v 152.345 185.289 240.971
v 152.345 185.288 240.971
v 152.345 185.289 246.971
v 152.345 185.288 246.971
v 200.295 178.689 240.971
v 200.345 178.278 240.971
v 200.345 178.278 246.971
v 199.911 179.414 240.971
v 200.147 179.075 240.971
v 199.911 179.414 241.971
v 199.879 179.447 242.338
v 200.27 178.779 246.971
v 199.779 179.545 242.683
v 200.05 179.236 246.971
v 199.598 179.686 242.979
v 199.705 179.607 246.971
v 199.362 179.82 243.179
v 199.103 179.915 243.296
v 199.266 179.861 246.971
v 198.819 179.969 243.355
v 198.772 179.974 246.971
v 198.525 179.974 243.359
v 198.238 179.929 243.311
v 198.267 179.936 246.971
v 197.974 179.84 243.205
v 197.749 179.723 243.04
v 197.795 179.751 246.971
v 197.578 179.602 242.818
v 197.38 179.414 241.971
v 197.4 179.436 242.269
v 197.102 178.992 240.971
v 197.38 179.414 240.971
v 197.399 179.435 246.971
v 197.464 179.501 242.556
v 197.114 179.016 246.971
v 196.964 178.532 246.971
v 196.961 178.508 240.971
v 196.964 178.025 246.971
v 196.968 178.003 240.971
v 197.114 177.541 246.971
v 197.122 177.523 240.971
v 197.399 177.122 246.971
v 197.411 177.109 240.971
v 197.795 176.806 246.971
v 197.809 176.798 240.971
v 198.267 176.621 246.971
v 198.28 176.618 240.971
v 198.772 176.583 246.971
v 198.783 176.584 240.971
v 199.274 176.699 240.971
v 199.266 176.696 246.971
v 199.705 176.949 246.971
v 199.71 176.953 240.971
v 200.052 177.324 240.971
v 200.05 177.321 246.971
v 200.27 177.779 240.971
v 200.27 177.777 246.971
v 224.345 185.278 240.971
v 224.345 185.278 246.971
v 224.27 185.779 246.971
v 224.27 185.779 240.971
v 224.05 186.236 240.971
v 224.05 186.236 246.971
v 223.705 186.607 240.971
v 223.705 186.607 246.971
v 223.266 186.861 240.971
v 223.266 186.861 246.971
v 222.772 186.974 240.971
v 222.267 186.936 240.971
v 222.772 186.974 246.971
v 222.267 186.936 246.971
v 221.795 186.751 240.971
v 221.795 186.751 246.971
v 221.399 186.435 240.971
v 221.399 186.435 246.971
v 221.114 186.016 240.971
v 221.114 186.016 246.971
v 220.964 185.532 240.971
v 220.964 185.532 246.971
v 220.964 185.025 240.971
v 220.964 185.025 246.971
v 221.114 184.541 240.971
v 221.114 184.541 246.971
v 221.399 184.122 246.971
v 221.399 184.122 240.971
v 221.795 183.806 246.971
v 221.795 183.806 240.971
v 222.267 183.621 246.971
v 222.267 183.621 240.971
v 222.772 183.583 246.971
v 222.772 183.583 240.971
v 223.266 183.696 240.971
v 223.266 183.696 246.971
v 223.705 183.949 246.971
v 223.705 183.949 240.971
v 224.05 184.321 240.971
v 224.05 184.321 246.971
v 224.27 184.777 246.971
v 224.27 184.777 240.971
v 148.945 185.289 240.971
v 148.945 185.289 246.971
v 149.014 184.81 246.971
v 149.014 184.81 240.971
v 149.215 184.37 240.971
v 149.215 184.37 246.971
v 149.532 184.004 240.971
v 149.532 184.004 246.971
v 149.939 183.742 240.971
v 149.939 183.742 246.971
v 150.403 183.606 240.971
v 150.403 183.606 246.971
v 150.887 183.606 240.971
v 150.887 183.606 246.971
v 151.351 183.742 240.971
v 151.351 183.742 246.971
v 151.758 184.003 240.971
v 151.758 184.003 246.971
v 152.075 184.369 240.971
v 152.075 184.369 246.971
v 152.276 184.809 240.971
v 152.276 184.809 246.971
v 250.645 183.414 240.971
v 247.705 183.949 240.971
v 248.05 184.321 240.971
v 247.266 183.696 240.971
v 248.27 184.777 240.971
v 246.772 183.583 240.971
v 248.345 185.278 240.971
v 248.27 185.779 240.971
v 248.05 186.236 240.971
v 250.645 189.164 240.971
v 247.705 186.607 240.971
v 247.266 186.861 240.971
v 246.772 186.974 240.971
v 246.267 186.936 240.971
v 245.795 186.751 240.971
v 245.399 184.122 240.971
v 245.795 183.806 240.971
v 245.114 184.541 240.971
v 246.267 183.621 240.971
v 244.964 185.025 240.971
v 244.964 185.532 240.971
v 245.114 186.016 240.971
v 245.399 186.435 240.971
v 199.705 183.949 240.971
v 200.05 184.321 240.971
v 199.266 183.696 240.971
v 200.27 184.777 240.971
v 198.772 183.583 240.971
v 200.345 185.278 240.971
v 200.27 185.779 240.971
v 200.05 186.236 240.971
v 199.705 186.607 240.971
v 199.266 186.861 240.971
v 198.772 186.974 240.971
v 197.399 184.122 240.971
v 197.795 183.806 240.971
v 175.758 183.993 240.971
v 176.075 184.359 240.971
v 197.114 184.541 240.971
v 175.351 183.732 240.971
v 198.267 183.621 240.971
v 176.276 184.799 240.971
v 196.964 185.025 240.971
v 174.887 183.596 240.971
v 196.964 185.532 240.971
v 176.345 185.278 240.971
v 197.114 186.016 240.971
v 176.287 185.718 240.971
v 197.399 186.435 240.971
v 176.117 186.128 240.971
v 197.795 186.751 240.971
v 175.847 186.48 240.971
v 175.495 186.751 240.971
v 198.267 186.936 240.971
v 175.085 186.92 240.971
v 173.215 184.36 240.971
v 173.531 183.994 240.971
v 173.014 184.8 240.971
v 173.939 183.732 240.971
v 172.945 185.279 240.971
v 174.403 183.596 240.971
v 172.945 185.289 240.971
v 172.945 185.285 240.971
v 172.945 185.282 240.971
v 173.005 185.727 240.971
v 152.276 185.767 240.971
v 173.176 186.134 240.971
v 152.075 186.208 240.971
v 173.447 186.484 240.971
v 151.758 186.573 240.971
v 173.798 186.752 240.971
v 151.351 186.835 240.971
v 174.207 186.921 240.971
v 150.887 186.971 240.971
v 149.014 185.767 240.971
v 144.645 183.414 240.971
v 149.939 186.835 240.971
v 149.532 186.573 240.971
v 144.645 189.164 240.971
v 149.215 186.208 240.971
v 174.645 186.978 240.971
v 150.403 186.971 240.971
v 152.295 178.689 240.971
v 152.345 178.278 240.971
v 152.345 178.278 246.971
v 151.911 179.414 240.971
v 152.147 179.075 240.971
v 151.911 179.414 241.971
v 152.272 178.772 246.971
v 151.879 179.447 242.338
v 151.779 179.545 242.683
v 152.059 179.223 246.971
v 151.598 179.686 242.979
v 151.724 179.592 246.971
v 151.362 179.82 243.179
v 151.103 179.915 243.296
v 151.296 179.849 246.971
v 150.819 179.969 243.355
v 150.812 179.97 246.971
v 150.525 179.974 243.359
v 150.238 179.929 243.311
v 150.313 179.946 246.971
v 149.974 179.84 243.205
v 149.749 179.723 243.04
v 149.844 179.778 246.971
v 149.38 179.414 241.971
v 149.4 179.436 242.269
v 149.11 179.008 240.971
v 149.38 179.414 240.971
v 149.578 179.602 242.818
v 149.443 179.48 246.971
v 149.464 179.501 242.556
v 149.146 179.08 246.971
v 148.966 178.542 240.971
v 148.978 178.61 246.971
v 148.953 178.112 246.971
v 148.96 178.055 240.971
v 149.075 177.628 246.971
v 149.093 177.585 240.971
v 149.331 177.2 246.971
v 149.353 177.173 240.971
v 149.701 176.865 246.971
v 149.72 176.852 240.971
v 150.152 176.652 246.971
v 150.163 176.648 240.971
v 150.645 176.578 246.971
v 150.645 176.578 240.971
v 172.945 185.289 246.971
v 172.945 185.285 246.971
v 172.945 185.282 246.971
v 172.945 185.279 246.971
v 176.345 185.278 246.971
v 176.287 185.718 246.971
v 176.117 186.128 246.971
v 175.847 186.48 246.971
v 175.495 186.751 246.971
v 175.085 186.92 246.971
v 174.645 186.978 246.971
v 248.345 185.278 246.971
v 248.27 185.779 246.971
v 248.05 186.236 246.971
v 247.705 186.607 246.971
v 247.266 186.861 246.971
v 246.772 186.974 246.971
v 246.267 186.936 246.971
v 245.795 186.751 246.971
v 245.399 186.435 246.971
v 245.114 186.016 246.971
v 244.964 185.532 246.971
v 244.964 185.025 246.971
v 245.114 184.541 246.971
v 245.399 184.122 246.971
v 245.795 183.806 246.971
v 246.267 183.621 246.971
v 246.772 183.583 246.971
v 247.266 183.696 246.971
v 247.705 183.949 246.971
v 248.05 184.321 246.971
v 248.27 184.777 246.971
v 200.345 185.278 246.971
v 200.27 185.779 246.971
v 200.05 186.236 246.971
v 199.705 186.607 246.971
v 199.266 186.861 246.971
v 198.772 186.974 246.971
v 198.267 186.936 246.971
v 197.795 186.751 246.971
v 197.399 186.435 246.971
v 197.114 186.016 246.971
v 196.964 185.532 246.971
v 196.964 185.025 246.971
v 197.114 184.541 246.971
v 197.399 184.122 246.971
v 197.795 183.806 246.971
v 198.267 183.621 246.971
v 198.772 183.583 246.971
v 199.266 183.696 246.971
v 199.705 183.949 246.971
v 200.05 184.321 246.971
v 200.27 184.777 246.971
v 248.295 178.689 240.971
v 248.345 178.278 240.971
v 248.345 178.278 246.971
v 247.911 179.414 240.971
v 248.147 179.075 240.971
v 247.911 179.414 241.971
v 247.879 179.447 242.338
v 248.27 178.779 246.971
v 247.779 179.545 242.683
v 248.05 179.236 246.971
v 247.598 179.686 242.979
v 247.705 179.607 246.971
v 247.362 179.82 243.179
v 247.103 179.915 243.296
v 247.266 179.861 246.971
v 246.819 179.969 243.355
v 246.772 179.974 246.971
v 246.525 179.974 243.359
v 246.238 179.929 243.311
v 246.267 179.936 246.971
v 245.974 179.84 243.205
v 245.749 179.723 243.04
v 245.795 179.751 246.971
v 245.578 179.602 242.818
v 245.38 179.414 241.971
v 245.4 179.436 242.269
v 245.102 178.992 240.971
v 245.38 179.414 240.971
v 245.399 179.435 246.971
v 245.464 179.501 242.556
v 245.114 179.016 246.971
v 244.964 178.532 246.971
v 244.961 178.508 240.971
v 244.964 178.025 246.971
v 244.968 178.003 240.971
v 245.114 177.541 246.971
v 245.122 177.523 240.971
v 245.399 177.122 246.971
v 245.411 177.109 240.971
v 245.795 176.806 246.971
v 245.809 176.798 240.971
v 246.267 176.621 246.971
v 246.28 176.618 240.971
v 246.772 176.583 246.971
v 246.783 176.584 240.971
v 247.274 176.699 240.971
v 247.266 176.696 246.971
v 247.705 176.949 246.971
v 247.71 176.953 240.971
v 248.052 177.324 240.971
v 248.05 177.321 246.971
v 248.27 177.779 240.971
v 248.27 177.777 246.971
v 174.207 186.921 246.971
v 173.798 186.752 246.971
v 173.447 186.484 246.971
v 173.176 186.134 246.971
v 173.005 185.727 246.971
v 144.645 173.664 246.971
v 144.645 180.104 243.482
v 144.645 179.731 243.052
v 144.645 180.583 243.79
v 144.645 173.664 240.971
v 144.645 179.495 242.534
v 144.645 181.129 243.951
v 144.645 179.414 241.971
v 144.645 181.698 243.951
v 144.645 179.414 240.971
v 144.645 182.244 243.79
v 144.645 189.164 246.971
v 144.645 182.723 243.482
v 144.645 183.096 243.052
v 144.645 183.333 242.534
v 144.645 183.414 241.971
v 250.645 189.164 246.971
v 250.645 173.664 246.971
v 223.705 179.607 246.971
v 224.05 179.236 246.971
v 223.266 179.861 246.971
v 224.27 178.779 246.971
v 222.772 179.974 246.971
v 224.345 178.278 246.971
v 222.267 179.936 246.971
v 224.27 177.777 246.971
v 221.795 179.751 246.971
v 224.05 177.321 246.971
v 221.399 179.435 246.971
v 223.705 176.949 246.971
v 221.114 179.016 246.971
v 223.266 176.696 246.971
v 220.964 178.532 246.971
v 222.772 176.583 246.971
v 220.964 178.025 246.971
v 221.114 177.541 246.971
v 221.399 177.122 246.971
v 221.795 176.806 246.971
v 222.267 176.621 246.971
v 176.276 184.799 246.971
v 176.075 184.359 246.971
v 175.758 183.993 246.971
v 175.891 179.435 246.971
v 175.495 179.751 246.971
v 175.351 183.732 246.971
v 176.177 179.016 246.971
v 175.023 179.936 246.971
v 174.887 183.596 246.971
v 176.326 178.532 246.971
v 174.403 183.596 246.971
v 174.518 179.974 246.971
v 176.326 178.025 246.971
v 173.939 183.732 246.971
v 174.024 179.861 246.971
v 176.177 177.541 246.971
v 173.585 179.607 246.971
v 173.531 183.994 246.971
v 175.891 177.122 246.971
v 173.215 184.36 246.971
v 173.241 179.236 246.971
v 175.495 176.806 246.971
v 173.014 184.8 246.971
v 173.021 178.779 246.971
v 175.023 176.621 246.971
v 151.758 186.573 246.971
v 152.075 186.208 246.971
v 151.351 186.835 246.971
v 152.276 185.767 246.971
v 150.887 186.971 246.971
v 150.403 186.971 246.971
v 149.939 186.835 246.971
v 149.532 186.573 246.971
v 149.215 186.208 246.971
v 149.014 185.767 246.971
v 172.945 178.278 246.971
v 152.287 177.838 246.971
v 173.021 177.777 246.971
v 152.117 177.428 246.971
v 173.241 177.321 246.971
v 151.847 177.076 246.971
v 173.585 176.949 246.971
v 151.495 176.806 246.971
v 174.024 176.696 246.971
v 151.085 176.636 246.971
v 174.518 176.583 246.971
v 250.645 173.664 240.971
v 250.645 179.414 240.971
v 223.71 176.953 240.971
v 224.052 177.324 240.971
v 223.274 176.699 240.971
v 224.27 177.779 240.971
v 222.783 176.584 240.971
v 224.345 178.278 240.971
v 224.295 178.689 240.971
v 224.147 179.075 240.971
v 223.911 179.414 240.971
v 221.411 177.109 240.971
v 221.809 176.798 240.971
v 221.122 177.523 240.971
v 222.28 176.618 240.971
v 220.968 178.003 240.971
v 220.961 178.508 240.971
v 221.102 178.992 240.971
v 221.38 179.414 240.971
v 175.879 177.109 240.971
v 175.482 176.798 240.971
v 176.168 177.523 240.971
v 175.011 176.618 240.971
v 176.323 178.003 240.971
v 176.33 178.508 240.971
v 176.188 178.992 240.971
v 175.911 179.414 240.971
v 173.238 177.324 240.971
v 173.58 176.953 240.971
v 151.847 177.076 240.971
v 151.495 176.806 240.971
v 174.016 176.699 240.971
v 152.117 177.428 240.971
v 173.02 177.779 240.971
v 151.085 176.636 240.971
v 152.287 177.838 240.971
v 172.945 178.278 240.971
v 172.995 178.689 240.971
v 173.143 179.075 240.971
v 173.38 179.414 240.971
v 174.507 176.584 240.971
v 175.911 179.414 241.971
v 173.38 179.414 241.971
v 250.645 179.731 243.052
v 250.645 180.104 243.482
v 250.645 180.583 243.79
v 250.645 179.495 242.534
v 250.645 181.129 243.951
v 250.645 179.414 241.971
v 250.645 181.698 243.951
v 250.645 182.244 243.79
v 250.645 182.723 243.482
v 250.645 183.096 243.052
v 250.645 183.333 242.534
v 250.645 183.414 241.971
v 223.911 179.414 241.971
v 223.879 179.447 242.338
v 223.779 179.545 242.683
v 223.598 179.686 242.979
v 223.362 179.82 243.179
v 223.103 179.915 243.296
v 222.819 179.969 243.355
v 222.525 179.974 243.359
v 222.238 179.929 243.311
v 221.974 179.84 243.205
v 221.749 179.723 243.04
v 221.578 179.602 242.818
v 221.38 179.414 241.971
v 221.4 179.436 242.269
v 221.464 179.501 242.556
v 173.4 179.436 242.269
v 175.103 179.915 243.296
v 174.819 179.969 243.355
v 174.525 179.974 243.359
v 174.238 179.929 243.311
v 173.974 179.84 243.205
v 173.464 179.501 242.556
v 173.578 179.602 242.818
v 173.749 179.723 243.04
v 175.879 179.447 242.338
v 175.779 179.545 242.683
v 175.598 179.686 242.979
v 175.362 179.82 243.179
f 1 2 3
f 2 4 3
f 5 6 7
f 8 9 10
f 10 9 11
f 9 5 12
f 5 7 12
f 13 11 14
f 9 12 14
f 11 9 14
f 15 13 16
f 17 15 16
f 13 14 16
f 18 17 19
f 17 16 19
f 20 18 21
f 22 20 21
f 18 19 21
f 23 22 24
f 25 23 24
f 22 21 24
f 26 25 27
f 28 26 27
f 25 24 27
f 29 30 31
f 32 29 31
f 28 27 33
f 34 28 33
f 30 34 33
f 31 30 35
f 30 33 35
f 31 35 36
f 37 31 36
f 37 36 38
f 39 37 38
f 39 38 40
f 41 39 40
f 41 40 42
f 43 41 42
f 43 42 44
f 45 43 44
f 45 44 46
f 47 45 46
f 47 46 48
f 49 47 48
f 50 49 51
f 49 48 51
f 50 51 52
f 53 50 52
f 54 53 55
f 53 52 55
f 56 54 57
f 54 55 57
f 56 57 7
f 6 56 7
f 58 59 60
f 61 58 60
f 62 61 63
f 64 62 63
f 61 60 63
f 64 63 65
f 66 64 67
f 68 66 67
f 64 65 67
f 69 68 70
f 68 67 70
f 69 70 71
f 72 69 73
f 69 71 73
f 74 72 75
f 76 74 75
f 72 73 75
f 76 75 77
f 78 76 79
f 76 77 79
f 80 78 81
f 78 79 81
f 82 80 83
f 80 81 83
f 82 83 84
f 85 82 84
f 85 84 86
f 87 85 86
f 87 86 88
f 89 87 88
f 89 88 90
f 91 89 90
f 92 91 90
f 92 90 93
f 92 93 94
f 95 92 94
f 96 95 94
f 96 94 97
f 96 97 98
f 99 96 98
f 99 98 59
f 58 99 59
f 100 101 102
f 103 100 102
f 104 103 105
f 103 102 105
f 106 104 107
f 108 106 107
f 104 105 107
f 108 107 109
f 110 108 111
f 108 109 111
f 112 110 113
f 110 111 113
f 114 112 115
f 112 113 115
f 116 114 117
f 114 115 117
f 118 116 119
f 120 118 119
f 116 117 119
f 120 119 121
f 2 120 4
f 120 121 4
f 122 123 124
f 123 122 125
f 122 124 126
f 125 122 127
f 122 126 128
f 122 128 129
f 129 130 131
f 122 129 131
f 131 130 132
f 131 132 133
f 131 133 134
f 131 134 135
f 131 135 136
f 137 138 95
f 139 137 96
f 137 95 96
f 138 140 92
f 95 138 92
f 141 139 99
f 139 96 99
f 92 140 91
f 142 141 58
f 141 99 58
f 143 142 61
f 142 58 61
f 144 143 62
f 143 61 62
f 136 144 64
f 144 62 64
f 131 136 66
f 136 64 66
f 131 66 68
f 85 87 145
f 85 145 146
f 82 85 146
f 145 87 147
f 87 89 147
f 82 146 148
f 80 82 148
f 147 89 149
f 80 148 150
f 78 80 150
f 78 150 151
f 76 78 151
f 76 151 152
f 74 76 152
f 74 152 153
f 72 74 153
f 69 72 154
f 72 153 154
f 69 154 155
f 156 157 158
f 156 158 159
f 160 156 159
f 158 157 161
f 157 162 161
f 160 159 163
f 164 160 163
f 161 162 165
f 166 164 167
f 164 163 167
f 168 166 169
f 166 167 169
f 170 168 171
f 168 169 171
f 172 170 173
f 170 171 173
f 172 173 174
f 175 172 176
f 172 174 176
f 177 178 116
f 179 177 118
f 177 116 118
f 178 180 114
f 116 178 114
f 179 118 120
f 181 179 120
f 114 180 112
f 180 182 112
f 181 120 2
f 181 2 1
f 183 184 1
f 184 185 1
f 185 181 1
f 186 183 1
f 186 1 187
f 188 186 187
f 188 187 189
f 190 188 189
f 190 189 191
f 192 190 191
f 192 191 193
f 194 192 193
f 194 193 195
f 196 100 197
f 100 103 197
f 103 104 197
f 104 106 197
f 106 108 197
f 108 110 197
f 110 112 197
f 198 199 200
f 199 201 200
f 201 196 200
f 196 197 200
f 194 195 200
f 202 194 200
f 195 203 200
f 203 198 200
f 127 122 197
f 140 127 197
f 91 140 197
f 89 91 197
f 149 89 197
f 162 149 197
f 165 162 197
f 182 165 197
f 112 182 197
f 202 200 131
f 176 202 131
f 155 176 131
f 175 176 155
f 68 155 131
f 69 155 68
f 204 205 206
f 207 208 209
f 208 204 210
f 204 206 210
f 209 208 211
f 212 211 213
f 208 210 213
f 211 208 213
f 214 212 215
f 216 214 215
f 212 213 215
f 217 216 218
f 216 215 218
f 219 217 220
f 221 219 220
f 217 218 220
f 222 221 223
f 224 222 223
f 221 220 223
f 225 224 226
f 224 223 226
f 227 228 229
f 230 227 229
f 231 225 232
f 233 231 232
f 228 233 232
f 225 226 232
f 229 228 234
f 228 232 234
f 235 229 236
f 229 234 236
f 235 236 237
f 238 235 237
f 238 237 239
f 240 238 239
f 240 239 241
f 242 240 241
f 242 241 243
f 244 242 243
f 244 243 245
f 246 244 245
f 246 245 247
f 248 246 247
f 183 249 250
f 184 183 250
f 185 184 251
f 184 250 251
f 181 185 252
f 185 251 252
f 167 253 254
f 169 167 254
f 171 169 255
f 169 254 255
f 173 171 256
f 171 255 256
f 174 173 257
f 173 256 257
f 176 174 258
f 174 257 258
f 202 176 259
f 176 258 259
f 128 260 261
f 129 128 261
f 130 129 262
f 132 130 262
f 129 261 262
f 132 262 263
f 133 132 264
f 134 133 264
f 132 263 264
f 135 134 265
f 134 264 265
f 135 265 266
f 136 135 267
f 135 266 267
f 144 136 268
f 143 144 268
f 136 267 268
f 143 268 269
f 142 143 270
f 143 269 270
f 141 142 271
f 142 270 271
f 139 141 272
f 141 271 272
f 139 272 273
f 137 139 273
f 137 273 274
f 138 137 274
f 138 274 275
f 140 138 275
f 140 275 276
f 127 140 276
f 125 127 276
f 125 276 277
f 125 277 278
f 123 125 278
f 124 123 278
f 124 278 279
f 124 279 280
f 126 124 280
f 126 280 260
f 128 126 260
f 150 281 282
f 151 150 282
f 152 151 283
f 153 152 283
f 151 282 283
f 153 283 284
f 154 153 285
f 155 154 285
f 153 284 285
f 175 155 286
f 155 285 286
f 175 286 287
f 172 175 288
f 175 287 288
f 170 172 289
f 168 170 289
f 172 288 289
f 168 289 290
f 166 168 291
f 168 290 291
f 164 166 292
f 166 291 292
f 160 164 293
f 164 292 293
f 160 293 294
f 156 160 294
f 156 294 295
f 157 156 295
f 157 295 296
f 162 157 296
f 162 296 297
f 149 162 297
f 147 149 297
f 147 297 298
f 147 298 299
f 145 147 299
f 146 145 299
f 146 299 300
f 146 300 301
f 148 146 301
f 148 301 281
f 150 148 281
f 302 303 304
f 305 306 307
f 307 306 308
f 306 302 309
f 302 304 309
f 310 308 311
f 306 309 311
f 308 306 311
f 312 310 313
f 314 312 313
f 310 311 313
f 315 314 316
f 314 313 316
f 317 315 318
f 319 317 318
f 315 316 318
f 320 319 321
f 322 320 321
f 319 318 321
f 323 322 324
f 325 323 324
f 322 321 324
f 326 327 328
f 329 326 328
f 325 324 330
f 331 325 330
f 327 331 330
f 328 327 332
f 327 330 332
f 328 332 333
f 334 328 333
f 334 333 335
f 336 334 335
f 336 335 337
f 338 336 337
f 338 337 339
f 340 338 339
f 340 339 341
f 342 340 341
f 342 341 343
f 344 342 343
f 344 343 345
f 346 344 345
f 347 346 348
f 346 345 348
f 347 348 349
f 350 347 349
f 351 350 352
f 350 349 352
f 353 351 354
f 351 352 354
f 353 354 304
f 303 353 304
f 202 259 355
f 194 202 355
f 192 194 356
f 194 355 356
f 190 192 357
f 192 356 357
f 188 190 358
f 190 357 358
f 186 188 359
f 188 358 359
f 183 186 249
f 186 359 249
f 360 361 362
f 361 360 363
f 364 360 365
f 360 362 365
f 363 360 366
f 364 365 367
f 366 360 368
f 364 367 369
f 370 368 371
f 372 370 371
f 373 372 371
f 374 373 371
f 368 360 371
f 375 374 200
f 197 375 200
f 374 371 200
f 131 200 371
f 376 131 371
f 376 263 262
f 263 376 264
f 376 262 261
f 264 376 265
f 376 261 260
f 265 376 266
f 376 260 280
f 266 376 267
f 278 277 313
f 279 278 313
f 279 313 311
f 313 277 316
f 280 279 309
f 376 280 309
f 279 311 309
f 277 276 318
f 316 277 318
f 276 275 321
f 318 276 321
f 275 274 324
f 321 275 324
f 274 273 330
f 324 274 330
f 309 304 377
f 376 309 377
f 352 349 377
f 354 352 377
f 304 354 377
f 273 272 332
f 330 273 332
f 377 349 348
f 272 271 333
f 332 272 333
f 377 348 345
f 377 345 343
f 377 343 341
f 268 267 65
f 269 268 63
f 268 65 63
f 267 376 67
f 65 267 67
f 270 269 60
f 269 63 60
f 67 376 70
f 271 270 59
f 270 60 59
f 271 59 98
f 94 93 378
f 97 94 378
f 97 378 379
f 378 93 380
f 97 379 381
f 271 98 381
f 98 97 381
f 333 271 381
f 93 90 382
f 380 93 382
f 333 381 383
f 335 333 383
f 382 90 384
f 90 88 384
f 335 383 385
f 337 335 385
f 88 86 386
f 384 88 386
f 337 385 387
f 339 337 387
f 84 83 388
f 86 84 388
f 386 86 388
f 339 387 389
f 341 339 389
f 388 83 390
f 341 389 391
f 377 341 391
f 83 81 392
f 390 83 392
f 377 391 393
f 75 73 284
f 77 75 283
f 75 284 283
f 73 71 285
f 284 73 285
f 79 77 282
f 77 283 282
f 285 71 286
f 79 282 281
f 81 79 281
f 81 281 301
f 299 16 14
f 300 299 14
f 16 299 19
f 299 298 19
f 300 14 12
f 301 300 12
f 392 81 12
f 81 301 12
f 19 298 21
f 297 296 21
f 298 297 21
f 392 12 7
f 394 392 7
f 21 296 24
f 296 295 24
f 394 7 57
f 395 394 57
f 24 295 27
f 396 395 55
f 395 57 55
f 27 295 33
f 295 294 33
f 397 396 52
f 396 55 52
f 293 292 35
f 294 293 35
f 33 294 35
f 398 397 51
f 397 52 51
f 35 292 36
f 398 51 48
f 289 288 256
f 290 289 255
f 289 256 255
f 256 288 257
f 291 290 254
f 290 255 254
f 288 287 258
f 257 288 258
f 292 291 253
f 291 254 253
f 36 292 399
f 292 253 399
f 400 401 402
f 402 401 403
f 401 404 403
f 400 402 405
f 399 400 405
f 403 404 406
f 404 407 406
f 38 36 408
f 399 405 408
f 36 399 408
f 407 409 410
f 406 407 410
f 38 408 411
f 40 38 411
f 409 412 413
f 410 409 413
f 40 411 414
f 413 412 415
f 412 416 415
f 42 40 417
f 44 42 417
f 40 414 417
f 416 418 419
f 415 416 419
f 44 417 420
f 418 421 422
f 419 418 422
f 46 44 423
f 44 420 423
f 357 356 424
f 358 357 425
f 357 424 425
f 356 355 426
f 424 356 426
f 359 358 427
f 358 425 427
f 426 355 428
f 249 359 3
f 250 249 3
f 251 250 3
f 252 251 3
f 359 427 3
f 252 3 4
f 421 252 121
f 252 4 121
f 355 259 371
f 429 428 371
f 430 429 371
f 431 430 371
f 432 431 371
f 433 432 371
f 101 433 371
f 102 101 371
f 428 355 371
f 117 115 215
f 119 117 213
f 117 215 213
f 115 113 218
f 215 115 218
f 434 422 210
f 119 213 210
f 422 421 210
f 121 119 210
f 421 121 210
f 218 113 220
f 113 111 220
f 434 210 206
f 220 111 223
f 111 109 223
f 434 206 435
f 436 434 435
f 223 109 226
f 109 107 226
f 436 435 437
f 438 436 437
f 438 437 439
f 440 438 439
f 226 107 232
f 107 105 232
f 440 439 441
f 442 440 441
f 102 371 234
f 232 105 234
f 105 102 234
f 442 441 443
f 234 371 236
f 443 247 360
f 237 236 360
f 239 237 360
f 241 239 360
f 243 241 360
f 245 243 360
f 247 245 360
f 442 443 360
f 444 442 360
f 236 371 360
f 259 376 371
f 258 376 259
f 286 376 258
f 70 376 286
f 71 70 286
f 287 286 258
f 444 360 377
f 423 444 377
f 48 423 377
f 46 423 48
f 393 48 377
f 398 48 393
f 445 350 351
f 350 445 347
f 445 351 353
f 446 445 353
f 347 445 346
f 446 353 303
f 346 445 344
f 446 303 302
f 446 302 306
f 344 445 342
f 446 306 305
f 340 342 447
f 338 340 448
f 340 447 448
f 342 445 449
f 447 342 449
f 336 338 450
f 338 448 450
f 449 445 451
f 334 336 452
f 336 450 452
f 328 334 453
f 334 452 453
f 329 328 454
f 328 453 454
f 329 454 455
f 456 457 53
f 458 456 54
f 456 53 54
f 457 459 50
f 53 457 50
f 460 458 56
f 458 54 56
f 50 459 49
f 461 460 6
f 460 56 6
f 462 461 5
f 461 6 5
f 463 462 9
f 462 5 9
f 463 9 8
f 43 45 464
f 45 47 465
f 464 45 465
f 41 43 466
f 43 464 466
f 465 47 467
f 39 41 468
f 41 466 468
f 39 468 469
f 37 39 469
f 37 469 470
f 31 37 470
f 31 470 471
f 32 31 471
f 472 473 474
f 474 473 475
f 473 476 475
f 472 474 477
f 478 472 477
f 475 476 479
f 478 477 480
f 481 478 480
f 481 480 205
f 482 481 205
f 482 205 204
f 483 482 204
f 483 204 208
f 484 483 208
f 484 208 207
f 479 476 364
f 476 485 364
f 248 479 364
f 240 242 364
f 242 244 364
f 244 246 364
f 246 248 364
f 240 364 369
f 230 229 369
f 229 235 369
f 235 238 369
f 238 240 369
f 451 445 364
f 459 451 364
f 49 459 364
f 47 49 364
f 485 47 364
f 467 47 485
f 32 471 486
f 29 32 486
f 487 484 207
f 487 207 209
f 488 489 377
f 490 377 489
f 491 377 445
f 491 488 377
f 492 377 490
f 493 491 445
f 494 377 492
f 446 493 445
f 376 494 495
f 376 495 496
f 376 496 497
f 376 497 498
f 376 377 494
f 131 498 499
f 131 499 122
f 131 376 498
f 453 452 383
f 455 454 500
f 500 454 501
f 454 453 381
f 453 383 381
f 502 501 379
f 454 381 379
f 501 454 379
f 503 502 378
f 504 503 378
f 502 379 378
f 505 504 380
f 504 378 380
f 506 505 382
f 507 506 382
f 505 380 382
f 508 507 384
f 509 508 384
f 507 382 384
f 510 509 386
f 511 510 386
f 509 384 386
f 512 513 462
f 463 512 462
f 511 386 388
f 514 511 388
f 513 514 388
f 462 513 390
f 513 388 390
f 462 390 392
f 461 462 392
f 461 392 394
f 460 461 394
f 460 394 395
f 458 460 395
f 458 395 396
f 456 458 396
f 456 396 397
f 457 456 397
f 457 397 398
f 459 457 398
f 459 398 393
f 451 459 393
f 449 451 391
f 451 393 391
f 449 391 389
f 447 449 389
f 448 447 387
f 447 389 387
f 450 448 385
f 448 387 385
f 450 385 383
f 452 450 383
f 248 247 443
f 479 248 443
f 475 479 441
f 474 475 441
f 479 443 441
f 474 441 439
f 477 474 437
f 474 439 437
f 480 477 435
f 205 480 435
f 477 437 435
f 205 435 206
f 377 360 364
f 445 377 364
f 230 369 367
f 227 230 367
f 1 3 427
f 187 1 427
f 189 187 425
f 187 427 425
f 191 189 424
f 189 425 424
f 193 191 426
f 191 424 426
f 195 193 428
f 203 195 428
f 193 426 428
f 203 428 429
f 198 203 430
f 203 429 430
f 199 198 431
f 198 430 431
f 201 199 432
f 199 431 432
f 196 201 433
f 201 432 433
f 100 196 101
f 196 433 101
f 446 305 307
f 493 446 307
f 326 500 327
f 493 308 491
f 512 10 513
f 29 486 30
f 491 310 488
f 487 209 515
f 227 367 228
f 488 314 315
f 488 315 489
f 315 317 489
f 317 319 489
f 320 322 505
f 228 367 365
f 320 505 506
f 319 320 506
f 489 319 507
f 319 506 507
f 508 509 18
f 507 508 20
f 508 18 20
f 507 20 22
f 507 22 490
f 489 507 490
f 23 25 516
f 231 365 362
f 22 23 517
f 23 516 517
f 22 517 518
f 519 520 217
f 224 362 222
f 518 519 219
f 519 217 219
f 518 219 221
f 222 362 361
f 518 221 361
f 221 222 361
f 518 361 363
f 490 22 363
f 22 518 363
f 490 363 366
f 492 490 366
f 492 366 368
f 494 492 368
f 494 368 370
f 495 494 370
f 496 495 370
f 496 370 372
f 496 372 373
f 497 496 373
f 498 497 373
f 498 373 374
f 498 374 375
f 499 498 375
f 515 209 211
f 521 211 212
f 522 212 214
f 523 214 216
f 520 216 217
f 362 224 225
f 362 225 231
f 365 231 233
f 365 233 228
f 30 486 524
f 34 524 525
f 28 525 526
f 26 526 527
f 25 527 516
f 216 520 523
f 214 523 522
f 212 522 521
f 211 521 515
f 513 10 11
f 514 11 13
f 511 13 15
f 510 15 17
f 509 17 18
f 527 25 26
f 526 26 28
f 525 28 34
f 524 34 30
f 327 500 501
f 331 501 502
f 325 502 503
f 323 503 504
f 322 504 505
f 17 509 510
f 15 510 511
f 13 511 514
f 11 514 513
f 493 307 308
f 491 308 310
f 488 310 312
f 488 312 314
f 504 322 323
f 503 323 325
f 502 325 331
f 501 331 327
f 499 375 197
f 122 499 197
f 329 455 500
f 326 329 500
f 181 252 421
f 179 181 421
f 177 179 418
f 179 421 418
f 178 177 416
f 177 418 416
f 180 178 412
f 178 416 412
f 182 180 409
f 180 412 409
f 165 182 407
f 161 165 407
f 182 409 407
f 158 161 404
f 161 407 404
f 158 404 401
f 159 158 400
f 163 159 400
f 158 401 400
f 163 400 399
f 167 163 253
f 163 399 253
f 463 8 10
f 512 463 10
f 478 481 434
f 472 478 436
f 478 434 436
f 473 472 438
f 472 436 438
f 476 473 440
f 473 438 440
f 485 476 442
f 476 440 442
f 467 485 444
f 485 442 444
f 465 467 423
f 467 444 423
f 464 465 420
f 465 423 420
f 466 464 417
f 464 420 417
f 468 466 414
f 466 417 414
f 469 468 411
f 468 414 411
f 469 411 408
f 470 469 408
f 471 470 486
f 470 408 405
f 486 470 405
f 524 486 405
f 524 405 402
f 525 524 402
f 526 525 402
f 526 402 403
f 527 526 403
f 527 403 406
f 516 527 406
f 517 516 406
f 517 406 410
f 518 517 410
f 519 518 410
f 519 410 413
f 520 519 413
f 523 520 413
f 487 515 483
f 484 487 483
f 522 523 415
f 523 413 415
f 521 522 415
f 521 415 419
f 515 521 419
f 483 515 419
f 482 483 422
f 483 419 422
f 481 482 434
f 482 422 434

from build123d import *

# Parameters (mm, degrees)
BOSS_EXTRUDE1_DEPTH      = 60
BOSS_EXTRUDE1_DEPTH_BACK = 46
SKETCH2_R                = 1.7
CUT_EXTRUDE1_DEPTH       = 10


with BuildPart() as part:
    # Sketch1 → Boss-Extrude1 (new, two sides: drawn at the far end of the back side and taken through both)
    with BuildSketch(Plane(origin=(190.645148, 0, 0), x_dir=(0, 0, -1), z_dir=(1, 0, 0)).offset(-BOSS_EXTRUDE1_DEPTH_BACK)):
        with BuildLine():
            Line((-240.970904961, 189.163538159), (-246.970904961, 189.163538159))
            Line((-246.970904961, 189.163538159), (-246.970904961, 173.663538158))
            Line((-246.970904961, 173.663538158), (-240.970904961, 173.663538158))
            Line((-240.970904961, 173.663538158), (-240.970904961, 179.413538158))
            Line((-240.970904961, 179.413538158), (-241.970904961, 179.413538158))
            ThreePointArc((-241.970904961, 179.413538158), (-243.970904961, 181.413538158), (-241.970904961, 183.413538158))
            Line((-241.970904961, 183.413538158), (-240.970904961, 183.413538158))
            Line((-240.970904961, 183.413538158), (-240.970904961, 189.163538159))
        make_face()
    extrude(amount=BOSS_EXTRUDE1_DEPTH + BOSS_EXTRUDE1_DEPTH_BACK)

    # Sketch2 → Cut-Extrude1 (cut)
    with BuildSketch(Plane.XY.offset(246.970904961)):
        with BuildLine():
            ThreePointArc((176.345148, 178.278360264), (174.645148, 179.978360264), (172.945148, 178.278360264))
            ThreePointArc((172.945148, 178.278360264), (174.645148, 176.578360264), (176.345148, 178.278360264))
        make_face()
        with BuildLine():
            ThreePointArc((152.345148, 178.278360264), (149.443066472, 179.480441792), (150.645148, 176.578360264))
            Line((150.645148, 176.578360264), (150.645148, 178.278360264))
            Line((150.645148, 178.278360264), (152.345148, 178.278360264))
        make_face()
        with BuildLine():
            Line((150.645148, 178.278360264), (150.645148, 176.578360264))
            ThreePointArc((150.645148, 176.578360264), (151.847229528, 177.076278736), (152.345148, 178.278360264))
            Line((152.345148, 178.278360264), (150.645148, 178.278360264))
        make_face()
        with BuildLine():
            ThreePointArc((152.345148, 185.288538158), (150.645148, 186.988538158), (148.945148, 185.288538158))
            Line((148.945148, 185.288538158), (150.645148, 185.288538158))
            Line((150.645148, 185.288538158), (152.345148, 185.288538158))
        make_face()
        with BuildLine():
            Line((150.645148, 185.288538158), (148.945148, 185.288538158))
            ThreePointArc((148.945148, 185.288538158), (150.644787533, 183.588538197), (152.345147847, 185.287817224))
            Line((152.345147847, 185.287817224), (150.645148, 185.288538158))
        make_face()
        with BuildLine():
            Line((152.345148, 185.288538158), (150.645148, 185.288538158))
            Line((150.645148, 185.288538158), (152.345147847, 185.287817224))
            ThreePointArc((152.345147847, 185.287817224), (152.345147962, 185.288177691), (152.345148, 185.288538158))
        make_face()
        with BuildLine():
            ThreePointArc((176.345148, 185.278360264), (175.847229528, 186.480441792), (174.645148, 186.978360264))
            Line((174.645148, 186.978360264), (174.645148, 185.278360264))
            Line((174.645148, 185.278360264), (172.945148153, 185.279081198))
            ThreePointArc((172.945148153, 185.279081198), (174.644787533, 183.578360302), (176.345148, 185.278360264))
        make_face()
        with BuildLine():
            Line((174.645148, 185.278360264), (174.645148, 186.978360264))
            ThreePointArc((174.645148, 186.978360264), (173.446670303, 186.484034851), (172.945178468, 185.288538158))
            ThreePointArc((172.945178468, 185.288538158), (172.945156734, 185.283809699), (172.945148153, 185.279081198))
            Line((172.945148153, 185.279081198), (174.645148, 185.278360264))
        make_face()
        with Locations((198.645148, 178.278360264)):
            Circle(SKETCH2_R)
        with Locations((246.645148, 185.278360264)):
            Circle(SKETCH2_R)
        with Locations((246.645148, 178.278360264)):
            Circle(SKETCH2_R)
        with Locations((222.645148, 185.278360264)):
            Circle(SKETCH2_R)
        with Locations((222.645148, 178.278360264)):
            Circle(SKETCH2_R)
        with Locations((198.645148, 185.278360264)):
            Circle(SKETCH2_R)
    extrude(amount=-CUT_EXTRUDE1_DEPTH, mode=Mode.SUBTRACT)


solid = part.part
